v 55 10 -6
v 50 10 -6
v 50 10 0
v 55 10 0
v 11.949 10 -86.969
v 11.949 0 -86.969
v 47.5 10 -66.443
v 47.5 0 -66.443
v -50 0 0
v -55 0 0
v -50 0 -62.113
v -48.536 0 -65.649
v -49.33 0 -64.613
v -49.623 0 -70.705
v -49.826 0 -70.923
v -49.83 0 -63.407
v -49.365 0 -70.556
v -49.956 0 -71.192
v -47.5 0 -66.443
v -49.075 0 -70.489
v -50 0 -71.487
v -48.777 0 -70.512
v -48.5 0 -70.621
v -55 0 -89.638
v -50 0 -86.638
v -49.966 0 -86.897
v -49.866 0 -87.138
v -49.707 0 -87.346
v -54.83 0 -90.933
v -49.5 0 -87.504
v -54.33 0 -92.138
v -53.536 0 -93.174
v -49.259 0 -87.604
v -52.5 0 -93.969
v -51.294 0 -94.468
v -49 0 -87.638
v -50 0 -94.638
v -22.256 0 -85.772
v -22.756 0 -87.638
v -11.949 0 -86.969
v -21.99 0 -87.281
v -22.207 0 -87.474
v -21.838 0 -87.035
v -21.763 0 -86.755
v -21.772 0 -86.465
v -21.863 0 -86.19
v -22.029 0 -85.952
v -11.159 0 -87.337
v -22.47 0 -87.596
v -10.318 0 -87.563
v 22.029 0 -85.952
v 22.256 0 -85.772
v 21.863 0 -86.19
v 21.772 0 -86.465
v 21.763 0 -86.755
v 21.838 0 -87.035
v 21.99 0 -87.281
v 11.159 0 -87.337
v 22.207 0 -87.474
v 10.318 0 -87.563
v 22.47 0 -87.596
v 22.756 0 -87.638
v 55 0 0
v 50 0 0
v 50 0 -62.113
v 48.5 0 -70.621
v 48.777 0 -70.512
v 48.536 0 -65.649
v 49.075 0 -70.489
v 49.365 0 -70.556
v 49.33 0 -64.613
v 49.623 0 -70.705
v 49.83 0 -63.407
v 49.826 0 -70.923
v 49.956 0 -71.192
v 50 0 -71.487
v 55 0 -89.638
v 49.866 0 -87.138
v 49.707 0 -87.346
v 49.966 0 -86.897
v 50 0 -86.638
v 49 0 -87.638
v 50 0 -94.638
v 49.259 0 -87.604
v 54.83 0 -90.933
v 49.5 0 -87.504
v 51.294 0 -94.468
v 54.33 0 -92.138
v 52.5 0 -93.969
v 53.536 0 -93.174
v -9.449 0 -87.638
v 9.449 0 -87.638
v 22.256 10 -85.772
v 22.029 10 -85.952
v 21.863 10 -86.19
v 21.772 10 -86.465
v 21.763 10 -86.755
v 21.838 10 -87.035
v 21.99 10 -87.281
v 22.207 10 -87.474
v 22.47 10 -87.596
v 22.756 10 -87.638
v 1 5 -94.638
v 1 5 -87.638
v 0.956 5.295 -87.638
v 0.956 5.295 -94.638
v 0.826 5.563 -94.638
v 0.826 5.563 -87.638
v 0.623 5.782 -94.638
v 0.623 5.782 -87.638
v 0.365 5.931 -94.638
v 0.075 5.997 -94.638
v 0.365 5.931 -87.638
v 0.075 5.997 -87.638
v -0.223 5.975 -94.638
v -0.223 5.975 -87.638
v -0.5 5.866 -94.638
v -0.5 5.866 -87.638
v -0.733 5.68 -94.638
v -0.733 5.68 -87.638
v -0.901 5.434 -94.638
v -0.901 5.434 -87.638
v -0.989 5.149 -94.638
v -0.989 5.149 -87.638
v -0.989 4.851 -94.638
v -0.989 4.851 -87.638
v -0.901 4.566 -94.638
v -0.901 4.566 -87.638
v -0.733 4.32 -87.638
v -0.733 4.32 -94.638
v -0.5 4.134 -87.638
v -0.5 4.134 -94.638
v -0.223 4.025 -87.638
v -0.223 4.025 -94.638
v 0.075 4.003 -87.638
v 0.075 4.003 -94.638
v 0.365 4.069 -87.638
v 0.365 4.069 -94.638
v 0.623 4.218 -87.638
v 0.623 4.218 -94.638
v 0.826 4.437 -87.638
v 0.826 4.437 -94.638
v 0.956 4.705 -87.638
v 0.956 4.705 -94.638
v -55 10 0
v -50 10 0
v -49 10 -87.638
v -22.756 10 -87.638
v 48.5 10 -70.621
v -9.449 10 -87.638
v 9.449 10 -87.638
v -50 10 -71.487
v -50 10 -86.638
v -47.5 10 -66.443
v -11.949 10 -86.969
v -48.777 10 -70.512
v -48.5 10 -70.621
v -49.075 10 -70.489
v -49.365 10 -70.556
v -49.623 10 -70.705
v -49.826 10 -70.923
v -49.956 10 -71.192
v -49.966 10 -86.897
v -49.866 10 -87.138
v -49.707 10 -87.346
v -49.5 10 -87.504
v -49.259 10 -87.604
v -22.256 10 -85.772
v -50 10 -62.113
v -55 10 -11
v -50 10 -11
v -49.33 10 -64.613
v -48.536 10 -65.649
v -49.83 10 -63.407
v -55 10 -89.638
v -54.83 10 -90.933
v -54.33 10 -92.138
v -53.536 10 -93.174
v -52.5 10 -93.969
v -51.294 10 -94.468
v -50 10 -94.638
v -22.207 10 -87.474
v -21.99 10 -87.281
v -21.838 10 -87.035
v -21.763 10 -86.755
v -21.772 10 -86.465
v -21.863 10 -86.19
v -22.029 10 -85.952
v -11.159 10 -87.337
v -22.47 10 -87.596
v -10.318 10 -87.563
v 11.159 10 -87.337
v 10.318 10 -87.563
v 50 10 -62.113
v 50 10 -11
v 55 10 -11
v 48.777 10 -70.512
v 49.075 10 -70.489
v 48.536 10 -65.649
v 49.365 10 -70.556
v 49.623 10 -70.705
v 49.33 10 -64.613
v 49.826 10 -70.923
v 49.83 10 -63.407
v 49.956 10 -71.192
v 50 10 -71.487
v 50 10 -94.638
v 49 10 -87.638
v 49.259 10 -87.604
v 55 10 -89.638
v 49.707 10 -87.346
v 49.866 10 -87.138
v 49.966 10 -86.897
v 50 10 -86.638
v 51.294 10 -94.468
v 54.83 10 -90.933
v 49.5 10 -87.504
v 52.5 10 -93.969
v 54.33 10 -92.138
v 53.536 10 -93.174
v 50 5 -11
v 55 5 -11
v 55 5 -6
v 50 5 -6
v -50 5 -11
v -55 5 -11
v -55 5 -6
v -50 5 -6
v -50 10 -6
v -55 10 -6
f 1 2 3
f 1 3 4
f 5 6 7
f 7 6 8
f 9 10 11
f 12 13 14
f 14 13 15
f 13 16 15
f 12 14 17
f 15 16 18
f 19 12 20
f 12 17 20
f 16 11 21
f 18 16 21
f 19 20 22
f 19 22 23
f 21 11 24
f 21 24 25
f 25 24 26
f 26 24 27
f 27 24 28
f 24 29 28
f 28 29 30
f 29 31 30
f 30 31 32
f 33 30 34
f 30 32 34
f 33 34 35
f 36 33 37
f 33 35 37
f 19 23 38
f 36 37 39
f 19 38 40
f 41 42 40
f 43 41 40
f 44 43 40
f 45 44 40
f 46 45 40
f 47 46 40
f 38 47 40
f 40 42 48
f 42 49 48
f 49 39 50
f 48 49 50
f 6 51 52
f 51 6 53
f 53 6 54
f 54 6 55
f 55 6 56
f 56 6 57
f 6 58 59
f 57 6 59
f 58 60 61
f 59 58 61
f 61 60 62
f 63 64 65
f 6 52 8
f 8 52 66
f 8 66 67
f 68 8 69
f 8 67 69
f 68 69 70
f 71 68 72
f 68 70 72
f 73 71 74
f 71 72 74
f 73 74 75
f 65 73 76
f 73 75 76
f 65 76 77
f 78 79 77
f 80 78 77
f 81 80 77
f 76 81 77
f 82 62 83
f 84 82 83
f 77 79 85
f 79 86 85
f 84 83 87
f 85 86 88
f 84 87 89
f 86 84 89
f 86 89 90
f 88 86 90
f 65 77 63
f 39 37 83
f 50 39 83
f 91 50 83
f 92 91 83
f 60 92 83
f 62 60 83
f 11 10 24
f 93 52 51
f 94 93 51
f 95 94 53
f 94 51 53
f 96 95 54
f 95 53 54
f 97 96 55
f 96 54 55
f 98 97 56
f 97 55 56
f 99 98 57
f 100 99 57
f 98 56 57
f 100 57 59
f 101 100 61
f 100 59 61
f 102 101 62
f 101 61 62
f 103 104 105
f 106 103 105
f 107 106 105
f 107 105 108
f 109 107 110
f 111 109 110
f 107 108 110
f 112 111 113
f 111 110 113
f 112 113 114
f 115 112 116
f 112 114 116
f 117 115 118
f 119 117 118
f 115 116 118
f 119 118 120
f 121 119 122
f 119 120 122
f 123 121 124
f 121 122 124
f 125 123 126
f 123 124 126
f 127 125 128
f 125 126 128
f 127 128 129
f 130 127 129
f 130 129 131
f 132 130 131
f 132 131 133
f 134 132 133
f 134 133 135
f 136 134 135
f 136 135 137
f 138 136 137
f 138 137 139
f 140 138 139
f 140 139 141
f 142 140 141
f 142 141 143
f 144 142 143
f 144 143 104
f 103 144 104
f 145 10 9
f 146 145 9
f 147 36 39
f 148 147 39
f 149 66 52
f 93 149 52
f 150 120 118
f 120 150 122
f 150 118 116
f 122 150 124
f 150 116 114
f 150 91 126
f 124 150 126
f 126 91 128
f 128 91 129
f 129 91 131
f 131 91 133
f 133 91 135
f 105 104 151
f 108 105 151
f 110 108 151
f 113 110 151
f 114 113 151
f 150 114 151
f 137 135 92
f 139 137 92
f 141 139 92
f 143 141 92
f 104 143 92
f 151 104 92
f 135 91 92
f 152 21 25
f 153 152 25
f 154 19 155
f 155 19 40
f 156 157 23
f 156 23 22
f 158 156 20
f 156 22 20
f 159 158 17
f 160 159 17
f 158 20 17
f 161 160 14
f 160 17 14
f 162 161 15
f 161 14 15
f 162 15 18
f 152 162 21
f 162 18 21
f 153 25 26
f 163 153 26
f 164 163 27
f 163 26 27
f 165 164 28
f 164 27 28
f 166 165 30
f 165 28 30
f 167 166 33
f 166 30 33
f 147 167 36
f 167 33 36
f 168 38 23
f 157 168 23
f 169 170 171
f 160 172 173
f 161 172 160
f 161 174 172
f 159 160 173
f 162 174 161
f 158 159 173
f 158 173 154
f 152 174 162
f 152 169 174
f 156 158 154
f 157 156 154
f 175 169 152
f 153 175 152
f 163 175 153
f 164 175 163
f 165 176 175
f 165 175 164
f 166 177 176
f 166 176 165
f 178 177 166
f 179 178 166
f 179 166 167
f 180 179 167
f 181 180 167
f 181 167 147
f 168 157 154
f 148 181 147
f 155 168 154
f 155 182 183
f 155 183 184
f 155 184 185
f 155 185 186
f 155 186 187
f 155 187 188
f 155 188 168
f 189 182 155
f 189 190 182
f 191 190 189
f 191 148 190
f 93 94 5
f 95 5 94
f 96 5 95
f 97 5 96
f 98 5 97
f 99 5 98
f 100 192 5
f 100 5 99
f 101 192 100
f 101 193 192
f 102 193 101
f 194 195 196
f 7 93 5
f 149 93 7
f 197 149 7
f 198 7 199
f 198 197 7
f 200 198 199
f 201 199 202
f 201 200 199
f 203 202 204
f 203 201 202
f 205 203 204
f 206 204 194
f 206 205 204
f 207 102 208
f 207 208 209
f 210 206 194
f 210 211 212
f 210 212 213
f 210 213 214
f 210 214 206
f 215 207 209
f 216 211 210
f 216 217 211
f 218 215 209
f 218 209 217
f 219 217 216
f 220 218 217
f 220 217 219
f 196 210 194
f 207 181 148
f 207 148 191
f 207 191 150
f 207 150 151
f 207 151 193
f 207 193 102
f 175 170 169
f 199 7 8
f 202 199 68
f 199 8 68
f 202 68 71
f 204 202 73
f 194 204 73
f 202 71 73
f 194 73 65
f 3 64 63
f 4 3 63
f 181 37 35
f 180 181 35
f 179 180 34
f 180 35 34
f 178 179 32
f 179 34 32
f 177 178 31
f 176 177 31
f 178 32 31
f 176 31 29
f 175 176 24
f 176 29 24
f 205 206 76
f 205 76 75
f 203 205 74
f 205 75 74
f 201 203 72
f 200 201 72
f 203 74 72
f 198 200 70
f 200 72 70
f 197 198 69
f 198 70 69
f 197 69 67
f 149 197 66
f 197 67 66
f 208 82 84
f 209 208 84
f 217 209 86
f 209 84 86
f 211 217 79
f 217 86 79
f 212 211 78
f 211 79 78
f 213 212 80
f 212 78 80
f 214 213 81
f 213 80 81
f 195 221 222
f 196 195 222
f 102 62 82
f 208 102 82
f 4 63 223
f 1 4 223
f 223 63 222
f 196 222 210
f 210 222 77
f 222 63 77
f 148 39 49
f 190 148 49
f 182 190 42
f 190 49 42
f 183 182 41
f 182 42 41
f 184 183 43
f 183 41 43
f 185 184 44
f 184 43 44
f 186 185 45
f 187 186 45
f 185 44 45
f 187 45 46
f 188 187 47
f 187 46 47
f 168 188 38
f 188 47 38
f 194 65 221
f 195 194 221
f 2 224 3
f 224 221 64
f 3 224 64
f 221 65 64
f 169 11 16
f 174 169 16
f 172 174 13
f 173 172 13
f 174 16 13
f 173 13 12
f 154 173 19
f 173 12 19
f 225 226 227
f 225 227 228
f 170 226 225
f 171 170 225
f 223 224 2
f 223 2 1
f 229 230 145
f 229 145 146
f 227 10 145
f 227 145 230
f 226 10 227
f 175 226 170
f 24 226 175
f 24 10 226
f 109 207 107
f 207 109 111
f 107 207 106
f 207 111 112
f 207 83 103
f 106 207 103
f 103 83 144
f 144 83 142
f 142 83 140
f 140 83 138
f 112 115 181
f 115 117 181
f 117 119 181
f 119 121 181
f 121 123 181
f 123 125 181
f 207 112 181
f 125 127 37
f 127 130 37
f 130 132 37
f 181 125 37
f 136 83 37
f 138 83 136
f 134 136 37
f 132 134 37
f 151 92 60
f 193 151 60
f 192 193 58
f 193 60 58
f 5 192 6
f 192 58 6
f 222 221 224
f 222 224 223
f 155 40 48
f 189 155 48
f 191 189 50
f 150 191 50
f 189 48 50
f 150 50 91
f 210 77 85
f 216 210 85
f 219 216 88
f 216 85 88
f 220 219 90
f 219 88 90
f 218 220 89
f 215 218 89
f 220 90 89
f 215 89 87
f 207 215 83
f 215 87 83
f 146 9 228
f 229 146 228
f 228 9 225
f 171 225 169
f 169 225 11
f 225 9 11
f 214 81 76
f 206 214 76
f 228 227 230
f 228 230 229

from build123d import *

# Parameters (mm, degrees)
DODANIE_WYCI_GNI_CIE1_DEPTH   = 10
SZKIC1_W                      = 5
SZKIC1_H                      = 6
DODANIE_WYCI_GNI_CIE1_2_DEPTH = 10
DODANIE_WYCI_GNI_CIE1_3_DEPTH = 10
SZKIC1_3_W                    = 5
SZKIC1_3_H                    = 5
DODANIE_WYCI_GNI_CIE2_DEPTH   = 5
SZKIC2_R                      = 1
WYTNIJ_WYCI_GNI_CIE1_DEPTH    = 104.949507791


with BuildPart() as part:
    # Szkic1 → Dodanie-wyci_gni_cie1 (new body)
    with BuildSketch(Plane(origin=(0, 0, 0), x_dir=(1, 0, 0), z_dir=(0, 1, 0))):
        with BuildLine():
            Line((-9.449286184, 87.638462845), (9.449286184, 87.638462845))
            ThreePointArc((9.449286184, 87.638462845), (10.74338141, 87.468091977), (11.949286184, 86.968589864))
            Line((11.949286184, 86.968589864), (47.5, 66.443375673))
            ThreePointArc((47.5, 66.443375673), (49.330127019, 64.613248654), (50, 62.113248654))
            Line((50, 62.113248654), (50, 11))
            Line((50, 11), (55, 11))
            Line((55, 11), (55, 89.638462845))
            ThreePointArc((55, 89.638462845), (53.535533906, 93.173996751), (50, 94.638462845))
            Line((50, 94.638462845), (-50, 94.638462845))
            ThreePointArc((-50, 94.638462845), (-53.535533906, 93.173996751), (-55, 89.638462845))
            Line((-55, 89.638462845), (-55, 11))
            Line((-55, 11), (-50, 11))
            Line((-50, 11), (-50, 62.113248654))
            ThreePointArc((-50, 62.113248654), (-49.330127019, 64.613248654), (-47.5, 66.443375673))
            Line((-47.5, 66.443375673), (-11.949286184, 86.968589864))
            ThreePointArc((-11.949286184, 86.968589864), (-10.74338141, 87.468091977), (-9.449286184, 87.638462845))
        make_face()
        with BuildLine():
            ThreePointArc((-48.5, 70.620674679), (-49.5, 70.620674679), (-50, 71.486700083))
            Line((-50, 71.486700083), (-50, 86.638462845))
            ThreePointArc((-50, 86.638462845), (-49.707106781, 87.345569627), (-49, 87.638462845))
            Line((-49, 87.638462845), (-22.756377072, 87.638462845))
            ThreePointArc((-22.756377072, 87.638462845), (-21.790451246, 86.89728189), (-22.256377072, 85.772437442))
            Line((-22.256377072, 85.772437442), (-48.5, 70.620674679))
        make_face(mode=Mode.SUBTRACT)
        with BuildLine():
            Line((48.5, 70.620674679), (22.256377072, 85.772437442))
            ThreePointArc((22.256377072, 85.772437442), (21.790451246, 86.89728189), (22.756377072, 87.638462845))
            Line((22.756377072, 87.638462845), (49, 87.638462845))
            ThreePointArc((49, 87.638462845), (49.707106781, 87.345569627), (50, 86.638462845))
            Line((50, 86.638462845), (50, 71.486700083))
            ThreePointArc((50, 71.486700083), (49.5, 70.620674679), (48.5, 70.620674679))
        make_face(mode=Mode.SUBTRACT)
    extrude(amount=DODANIE_WYCI_GNI_CIE1_DEPTH)



with BuildPart() as body_2:
    # Szkic1 → Dodanie-wyci_gni_cie1 2 (new body)
    with BuildSketch(Plane(origin=(0, 0, 0), x_dir=(1, 0, 0), z_dir=(0, 1, 0))):
        with Locations((52.5, 3)):
            Rectangle(SZKIC1_W, SZKIC1_H)
    extrude(amount=DODANIE_WYCI_GNI_CIE1_2_DEPTH)


with BuildPart() as body_3:
    # Szkic1 → Dodanie-wyci_gni_cie1 3 (new body)
    with BuildSketch(Plane(origin=(0, 0, 0), x_dir=(1, 0, 0), z_dir=(0, 1, 0))):
        with Locations((-52.5, 3)):
            Rectangle(SZKIC1_W, SZKIC1_H)
    extrude(amount=DODANIE_WYCI_GNI_CIE1_3_DEPTH)


with BuildPart() as part_1:
    add(part.part)

    add(body_2.part)  # Dodanie-wyci_gni_cie2 merges body 2

    add(body_3.part)  # Dodanie-wyci_gni_cie2 merges body 3
    # Szkic1_3 → Dodanie-wyci_gni_cie2 (add)
    with BuildSketch(Plane(origin=(0, 0, 0), x_dir=(1, 0, 0), z_dir=(0, 1, 0))):
        with Locations((-52.5, 8.5)):
            Rectangle(SZKIC1_3_W, SZKIC1_3_H)
        with Locations((52.5, 8.5)):
            Rectangle(SZKIC1_3_W, SZKIC1_3_H)
    extrude(amount=DODANIE_WYCI_GNI_CIE2_DEPTH)

    # Szkic2 → Wytnij-wyci_gni_cie1 (cut, through all)
    with BuildSketch(Plane.XY.offset(-87.638462845)):
        with Locations((0, 5)):
            Circle(SZKIC2_R)
    extrude(amount=-WYTNIJ_WYCI_GNI_CIE1_DEPTH, mode=Mode.SUBTRACT)


solid = part_1.part
